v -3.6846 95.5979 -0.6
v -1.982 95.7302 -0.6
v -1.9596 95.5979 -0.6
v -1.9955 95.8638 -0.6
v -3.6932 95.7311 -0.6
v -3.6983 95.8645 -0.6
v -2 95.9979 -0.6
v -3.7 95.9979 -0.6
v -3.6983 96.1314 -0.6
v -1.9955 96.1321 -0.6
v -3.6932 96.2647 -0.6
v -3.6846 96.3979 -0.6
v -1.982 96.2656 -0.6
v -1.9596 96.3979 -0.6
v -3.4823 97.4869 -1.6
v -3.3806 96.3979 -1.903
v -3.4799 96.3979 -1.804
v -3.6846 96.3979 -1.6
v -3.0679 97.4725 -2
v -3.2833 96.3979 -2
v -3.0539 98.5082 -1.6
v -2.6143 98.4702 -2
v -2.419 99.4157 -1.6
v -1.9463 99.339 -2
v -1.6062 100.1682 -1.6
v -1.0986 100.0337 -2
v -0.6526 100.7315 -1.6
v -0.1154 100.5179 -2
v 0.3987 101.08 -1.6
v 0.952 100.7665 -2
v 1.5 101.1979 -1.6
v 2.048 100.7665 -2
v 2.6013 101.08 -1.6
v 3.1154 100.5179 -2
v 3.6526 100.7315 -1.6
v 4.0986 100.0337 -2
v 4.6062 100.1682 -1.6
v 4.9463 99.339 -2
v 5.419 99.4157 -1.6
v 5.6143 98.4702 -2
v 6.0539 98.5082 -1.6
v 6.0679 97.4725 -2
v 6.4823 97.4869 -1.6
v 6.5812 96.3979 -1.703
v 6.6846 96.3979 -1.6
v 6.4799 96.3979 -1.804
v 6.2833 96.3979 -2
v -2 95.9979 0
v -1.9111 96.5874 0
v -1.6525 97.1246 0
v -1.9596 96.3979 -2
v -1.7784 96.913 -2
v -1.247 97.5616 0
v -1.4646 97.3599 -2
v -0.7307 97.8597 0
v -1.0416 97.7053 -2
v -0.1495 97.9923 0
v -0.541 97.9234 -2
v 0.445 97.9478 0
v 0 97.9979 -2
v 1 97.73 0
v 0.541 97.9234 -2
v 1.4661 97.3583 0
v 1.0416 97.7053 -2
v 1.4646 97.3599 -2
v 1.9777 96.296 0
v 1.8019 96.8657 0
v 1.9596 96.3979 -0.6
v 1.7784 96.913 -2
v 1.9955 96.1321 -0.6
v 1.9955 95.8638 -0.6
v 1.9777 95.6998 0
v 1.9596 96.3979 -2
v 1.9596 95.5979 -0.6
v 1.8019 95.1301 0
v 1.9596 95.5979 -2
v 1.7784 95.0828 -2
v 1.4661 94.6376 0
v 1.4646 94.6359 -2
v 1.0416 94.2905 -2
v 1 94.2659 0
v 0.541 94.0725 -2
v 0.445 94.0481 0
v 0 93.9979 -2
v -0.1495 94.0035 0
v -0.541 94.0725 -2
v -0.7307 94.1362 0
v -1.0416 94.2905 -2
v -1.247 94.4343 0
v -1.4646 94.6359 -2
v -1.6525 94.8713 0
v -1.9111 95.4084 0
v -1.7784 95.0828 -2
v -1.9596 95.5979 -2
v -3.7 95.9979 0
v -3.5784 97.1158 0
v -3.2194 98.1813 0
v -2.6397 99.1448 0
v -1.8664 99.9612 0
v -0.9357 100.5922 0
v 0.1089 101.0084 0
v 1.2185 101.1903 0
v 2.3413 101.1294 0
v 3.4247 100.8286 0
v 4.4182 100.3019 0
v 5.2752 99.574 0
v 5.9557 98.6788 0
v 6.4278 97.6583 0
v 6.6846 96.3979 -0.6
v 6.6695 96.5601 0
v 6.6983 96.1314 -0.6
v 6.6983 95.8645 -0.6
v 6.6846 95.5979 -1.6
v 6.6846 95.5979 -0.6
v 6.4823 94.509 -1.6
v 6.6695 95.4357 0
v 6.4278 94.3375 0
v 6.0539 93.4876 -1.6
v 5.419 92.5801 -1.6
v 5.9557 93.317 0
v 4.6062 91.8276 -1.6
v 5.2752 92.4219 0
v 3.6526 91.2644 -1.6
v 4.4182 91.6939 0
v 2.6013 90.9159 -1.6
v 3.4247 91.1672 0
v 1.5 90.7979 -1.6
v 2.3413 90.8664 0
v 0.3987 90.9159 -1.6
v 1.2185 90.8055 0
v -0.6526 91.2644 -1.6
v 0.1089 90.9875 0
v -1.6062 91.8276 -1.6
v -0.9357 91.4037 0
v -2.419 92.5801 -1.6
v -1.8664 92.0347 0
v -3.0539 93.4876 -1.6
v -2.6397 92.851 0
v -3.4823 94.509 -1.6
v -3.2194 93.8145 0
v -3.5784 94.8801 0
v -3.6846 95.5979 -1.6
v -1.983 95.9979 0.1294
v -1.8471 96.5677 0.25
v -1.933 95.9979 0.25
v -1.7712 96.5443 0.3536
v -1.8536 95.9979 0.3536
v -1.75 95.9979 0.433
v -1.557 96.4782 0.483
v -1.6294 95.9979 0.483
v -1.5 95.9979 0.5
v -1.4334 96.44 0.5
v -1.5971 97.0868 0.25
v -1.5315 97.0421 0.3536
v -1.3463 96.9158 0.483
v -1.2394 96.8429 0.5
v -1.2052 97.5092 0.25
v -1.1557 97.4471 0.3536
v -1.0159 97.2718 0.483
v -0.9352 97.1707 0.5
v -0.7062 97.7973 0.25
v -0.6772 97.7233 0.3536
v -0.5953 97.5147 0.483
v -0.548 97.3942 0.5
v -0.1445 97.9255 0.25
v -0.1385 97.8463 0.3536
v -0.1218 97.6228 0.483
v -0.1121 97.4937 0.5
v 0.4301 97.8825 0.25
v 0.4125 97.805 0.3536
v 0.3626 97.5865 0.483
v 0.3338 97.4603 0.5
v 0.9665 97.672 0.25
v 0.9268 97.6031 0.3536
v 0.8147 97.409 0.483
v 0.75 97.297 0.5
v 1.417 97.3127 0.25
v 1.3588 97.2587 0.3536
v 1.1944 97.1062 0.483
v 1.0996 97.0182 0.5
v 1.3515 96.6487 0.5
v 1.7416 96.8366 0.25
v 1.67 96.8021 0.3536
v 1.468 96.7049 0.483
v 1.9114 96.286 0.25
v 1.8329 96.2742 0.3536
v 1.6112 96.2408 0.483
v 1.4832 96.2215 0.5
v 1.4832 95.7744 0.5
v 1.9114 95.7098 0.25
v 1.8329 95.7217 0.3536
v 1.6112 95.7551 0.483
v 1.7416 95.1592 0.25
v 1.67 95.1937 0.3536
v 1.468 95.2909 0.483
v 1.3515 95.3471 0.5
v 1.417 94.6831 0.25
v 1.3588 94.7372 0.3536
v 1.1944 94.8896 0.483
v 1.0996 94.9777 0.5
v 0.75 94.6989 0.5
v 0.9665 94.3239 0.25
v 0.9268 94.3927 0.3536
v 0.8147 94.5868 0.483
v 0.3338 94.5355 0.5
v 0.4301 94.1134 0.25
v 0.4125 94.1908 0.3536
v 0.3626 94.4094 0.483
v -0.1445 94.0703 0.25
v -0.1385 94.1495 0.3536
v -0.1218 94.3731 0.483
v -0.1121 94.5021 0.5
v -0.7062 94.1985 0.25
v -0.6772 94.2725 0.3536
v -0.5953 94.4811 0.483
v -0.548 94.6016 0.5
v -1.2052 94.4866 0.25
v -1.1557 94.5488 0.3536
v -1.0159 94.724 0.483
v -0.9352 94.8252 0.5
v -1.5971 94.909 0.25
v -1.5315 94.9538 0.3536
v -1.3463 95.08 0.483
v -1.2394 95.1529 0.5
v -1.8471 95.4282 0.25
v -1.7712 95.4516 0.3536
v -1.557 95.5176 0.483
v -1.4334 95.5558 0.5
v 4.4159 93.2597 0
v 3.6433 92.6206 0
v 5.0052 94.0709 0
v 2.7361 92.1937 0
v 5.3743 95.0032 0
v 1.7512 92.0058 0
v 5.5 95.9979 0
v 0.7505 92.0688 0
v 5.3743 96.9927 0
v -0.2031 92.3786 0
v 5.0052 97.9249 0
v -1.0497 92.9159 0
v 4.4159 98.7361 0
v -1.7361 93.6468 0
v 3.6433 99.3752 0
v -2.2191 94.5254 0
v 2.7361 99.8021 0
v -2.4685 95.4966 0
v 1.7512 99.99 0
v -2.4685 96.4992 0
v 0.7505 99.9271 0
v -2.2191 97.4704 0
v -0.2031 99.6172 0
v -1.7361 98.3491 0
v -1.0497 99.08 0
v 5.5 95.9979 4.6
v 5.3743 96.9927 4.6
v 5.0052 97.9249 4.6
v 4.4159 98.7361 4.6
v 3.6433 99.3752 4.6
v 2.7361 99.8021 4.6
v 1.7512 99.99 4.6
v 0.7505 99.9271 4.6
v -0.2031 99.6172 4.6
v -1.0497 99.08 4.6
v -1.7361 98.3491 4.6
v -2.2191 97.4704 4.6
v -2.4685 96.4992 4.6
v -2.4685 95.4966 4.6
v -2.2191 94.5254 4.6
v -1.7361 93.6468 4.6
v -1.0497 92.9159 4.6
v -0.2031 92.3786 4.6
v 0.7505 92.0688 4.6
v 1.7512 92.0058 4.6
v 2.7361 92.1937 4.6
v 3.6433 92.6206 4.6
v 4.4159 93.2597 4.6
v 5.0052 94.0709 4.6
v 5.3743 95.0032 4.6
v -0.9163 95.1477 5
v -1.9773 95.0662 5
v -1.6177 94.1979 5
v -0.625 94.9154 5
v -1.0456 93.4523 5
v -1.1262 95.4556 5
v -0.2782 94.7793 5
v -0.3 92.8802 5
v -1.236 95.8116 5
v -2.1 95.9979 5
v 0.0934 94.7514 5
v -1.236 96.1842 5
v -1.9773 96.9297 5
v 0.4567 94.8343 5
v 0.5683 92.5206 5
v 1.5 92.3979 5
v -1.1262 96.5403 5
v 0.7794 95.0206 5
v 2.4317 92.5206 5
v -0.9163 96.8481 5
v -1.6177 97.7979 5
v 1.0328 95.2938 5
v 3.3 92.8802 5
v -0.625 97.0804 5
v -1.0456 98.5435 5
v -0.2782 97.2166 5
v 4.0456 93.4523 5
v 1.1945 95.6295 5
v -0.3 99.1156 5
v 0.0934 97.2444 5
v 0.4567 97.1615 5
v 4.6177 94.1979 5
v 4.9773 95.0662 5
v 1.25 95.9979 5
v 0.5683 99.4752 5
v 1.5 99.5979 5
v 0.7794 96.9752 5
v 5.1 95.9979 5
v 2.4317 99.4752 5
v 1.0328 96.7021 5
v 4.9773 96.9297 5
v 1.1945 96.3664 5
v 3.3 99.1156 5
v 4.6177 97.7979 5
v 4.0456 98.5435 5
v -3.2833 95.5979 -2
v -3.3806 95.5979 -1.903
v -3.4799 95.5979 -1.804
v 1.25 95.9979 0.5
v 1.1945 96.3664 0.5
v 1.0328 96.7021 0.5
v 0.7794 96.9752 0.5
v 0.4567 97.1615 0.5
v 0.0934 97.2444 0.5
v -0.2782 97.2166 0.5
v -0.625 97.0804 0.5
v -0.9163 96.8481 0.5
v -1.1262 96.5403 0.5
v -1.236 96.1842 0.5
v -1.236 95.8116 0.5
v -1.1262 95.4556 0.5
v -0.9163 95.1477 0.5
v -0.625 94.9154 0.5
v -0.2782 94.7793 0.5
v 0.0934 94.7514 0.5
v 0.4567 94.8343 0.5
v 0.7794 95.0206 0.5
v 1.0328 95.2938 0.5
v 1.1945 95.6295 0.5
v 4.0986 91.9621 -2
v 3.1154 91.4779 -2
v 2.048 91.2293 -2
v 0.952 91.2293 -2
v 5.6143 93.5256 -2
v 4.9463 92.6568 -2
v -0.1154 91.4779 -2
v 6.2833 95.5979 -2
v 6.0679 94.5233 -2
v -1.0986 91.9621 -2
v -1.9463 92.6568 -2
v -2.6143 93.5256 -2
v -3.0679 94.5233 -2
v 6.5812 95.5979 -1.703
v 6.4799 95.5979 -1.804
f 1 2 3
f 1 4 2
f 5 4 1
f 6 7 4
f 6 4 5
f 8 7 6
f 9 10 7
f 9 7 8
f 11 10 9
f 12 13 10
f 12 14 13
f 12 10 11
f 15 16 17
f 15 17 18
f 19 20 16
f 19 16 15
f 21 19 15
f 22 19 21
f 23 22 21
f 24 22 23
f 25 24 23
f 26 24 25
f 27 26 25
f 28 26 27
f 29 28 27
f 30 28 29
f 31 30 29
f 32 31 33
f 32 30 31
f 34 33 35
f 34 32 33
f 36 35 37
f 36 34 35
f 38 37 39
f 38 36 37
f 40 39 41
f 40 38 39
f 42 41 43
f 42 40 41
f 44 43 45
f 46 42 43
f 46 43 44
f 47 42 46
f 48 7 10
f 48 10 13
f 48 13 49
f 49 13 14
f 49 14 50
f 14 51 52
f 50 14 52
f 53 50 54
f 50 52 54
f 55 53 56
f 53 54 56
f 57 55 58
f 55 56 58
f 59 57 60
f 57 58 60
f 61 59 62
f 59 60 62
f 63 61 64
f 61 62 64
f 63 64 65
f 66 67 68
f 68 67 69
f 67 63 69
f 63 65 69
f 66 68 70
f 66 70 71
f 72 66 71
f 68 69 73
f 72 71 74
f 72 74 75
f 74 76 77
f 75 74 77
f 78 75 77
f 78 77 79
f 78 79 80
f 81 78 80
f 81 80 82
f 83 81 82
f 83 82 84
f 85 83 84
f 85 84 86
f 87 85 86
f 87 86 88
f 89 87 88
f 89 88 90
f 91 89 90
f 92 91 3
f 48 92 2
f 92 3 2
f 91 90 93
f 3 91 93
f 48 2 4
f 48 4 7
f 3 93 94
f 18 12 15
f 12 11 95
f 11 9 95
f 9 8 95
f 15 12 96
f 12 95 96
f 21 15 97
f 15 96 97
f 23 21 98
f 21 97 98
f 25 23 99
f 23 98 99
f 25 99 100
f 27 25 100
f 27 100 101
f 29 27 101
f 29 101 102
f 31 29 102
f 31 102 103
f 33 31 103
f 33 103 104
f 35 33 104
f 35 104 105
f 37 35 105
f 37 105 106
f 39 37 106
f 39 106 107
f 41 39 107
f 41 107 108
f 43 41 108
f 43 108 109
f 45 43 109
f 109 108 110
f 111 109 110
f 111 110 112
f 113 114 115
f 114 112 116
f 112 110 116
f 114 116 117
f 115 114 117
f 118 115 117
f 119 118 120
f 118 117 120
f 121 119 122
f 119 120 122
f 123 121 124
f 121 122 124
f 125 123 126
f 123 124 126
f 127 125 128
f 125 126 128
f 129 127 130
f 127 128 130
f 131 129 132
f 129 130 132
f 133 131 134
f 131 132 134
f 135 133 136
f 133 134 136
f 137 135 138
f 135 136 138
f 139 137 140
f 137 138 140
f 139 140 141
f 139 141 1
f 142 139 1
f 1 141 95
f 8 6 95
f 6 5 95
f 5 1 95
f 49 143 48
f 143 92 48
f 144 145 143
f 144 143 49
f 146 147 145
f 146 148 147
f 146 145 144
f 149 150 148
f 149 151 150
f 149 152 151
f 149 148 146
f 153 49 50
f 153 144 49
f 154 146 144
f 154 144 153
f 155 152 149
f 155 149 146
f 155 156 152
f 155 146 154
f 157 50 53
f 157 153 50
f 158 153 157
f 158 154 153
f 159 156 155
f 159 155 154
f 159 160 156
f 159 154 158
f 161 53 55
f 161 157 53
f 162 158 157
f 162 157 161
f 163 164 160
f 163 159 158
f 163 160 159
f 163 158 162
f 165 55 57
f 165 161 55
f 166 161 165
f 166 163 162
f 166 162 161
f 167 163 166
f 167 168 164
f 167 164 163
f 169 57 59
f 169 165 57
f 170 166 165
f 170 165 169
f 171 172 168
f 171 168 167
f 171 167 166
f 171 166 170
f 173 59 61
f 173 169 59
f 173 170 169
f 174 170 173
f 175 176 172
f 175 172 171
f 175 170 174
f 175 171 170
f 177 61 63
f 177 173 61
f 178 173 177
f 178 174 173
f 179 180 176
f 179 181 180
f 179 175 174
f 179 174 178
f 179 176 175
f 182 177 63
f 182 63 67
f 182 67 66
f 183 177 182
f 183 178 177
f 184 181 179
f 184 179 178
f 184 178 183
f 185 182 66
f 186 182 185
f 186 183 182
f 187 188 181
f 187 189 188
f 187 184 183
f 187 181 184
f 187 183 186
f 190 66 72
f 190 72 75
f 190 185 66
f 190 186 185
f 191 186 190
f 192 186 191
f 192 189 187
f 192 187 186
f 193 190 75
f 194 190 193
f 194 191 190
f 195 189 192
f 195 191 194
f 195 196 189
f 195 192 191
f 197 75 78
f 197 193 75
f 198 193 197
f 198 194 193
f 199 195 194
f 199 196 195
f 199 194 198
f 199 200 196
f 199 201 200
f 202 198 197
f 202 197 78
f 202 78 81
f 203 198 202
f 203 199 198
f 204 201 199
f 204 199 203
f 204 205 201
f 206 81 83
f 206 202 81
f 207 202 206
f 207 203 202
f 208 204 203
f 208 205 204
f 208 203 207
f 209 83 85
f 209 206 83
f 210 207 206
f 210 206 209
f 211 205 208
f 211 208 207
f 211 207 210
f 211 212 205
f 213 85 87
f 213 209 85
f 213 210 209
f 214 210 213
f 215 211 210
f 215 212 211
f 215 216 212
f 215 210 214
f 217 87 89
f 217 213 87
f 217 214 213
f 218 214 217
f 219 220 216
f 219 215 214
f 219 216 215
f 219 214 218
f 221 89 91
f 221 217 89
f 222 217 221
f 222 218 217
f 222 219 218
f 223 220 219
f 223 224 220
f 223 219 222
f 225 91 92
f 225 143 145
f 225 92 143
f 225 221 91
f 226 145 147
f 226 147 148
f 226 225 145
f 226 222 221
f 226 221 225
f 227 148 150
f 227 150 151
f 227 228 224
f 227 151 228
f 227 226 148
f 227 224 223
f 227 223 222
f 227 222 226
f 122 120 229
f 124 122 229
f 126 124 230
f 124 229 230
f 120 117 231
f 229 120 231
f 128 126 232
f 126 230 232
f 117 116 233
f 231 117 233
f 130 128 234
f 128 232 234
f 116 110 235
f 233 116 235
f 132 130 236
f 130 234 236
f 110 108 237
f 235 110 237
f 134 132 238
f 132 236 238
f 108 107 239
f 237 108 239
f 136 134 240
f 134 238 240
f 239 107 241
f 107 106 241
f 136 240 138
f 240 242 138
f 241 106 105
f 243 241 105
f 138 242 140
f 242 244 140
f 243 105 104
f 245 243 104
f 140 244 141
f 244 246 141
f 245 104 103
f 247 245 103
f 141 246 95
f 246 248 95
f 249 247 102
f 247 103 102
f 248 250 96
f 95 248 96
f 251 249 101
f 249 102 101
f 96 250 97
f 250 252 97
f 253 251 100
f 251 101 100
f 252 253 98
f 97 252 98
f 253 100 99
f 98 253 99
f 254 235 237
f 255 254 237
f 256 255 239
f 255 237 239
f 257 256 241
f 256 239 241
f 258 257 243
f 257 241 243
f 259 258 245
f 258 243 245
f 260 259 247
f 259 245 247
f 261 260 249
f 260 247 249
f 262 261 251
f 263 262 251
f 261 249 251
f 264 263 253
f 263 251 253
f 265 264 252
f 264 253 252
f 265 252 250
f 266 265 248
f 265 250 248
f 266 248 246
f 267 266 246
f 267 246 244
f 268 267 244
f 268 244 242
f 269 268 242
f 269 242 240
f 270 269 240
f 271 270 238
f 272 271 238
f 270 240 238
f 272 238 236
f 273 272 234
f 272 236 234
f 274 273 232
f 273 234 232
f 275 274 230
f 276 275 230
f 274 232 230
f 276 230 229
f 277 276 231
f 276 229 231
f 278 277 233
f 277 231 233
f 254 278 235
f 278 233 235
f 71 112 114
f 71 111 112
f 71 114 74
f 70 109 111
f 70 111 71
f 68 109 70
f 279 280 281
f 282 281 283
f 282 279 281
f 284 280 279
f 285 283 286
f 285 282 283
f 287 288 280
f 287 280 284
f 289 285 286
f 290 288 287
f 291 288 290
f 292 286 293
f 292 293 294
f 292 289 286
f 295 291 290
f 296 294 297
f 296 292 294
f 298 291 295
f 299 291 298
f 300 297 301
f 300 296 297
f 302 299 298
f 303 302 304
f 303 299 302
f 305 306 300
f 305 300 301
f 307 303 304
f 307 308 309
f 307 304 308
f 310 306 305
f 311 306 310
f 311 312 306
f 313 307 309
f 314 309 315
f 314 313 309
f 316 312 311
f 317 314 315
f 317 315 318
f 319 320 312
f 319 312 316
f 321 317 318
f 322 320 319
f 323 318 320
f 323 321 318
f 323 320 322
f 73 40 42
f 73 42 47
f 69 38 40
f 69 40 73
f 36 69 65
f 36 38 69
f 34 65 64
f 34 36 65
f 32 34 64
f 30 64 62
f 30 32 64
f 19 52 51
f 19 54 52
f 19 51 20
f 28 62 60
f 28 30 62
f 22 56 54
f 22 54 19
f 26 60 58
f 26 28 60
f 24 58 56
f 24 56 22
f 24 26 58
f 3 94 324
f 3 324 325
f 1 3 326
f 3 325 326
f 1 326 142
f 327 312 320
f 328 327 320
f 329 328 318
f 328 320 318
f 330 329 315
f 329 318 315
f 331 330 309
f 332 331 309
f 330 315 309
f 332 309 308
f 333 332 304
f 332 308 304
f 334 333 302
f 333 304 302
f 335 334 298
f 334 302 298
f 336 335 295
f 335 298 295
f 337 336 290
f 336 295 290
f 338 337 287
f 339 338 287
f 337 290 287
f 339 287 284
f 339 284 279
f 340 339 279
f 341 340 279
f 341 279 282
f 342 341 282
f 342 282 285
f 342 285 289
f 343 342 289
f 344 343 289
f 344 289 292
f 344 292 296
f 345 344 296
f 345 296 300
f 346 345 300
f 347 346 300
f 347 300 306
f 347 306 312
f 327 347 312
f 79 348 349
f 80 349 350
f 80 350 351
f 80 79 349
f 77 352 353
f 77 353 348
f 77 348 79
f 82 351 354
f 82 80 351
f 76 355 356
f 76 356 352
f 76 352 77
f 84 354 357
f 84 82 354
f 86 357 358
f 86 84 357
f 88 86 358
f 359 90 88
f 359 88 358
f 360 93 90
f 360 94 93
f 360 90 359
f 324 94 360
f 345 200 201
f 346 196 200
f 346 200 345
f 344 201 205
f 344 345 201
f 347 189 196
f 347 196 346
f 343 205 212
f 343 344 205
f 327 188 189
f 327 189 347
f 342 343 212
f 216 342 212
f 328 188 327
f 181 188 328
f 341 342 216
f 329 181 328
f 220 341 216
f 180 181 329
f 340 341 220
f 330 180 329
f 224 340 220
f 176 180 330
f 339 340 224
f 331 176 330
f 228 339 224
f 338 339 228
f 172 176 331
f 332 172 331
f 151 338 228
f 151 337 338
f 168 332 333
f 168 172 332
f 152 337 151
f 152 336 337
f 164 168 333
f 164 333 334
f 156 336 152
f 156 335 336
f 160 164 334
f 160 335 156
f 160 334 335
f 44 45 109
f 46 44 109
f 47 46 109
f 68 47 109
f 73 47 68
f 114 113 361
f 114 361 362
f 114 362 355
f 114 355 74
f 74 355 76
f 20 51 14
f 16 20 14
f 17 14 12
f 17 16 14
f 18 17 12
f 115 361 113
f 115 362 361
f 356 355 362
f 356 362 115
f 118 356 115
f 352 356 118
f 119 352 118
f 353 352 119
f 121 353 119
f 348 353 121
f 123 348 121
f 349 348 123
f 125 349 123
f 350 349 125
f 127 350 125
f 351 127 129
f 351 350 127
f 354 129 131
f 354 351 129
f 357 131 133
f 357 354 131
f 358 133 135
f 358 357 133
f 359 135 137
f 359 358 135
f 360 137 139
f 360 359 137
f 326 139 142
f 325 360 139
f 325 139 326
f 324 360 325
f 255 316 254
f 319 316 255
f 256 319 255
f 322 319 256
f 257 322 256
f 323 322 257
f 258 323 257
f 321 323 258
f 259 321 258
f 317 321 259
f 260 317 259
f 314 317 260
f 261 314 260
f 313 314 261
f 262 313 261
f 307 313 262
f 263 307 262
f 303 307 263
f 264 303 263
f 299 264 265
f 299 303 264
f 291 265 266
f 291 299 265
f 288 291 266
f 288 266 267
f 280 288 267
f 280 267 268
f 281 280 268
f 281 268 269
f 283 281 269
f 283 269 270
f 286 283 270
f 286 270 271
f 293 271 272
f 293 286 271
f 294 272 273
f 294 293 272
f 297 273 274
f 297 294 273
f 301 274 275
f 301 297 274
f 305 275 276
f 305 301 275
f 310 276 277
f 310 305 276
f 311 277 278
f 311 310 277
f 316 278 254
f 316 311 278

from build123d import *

# Parameters (mm, degrees)
SKETCH1_R           = 4
BOSS_EXTRUDE1_DEPTH = 5
SKETCH2_R           = 5.2
BOSS_EXTRUDE2_DEPTH = 2
SKETCH3_R           = 1.25
CUT_EXTRUDE2_DEPTH  = 8
CHAMFER1_SIZE       = 0.4
SKETCH4_W           = 20
SKETCH4_H           = 0.8
CUT_EXTRUDE3_DEPTH  = 1.4
SKETCH5_R           = 2
CUT_EXTRUDE4_DEPTH  = 2.5
FILLET1_R           = 0.5


with BuildPart() as part:
    # Sketch1 → Boss-Extrude1 (new body)
    with BuildSketch(Plane.XY):
        with Locations((1.5, 95.99791663)):
            Circle(SKETCH1_R)
    extrude(amount=BOSS_EXTRUDE1_DEPTH)

    # Sketch2 → Boss-Extrude2 (add)
    with BuildSketch(Plane(origin=(0, 0, 0), x_dir=(-1, 0, 0), z_dir=(0, 0, -1))):
        with Locations((-1.5, 95.99791663)):
            Circle(SKETCH2_R)
    extrude(amount=BOSS_EXTRUDE2_DEPTH)

    # Sketch3 → Cut-Extrude2 (cut, through all)
    with BuildSketch(Plane.XY.offset(5)):
        with Locations((0, 95.99791663)):
            Circle(SKETCH3_R)
    extrude(amount=-CUT_EXTRUDE2_DEPTH, mode=Mode.SUBTRACT)

    # Chamfer1
    chamfer1_edges = [part.edges().sort_by_distance(p)[0] for p in [
        (-2.5, 95.99791663, 5),
        (6.7, 95.99791663, -2),
    ]]
    chamfer(chamfer1_edges, length=CHAMFER1_SIZE)

    # Sketch4 → Cut-Extrude3 (cut)
    with BuildSketch(Plane(origin=(0, 0, -2), x_dir=(-1, 0, 0), z_dir=(0, 0, -1))):
        with Locations((-1.5, 95.99791663)):
            Rectangle(SKETCH4_W, SKETCH4_H)
    extrude(amount=-CUT_EXTRUDE3_DEPTH, mode=Mode.SUBTRACT)

    # Sketch5 → Cut-Extrude4 (cut)
    with BuildSketch(Plane(origin=(0, 0, -2), x_dir=(-1, 0, 0), z_dir=(0, 0, -1))):
        with Locations((0, 95.99791663)):
            Circle(SKETCH5_R)
    extrude(amount=-CUT_EXTRUDE4_DEPTH, mode=Mode.SUBTRACT)

    # Fillet1
    fillet1_edges = [part.edges().sort_by_distance(p)[0] for p in [
        (2, 95.99791663, 0.5),
    ]]
    fillet(fillet1_edges, radius=FILLET1_R)


solid = part.part
